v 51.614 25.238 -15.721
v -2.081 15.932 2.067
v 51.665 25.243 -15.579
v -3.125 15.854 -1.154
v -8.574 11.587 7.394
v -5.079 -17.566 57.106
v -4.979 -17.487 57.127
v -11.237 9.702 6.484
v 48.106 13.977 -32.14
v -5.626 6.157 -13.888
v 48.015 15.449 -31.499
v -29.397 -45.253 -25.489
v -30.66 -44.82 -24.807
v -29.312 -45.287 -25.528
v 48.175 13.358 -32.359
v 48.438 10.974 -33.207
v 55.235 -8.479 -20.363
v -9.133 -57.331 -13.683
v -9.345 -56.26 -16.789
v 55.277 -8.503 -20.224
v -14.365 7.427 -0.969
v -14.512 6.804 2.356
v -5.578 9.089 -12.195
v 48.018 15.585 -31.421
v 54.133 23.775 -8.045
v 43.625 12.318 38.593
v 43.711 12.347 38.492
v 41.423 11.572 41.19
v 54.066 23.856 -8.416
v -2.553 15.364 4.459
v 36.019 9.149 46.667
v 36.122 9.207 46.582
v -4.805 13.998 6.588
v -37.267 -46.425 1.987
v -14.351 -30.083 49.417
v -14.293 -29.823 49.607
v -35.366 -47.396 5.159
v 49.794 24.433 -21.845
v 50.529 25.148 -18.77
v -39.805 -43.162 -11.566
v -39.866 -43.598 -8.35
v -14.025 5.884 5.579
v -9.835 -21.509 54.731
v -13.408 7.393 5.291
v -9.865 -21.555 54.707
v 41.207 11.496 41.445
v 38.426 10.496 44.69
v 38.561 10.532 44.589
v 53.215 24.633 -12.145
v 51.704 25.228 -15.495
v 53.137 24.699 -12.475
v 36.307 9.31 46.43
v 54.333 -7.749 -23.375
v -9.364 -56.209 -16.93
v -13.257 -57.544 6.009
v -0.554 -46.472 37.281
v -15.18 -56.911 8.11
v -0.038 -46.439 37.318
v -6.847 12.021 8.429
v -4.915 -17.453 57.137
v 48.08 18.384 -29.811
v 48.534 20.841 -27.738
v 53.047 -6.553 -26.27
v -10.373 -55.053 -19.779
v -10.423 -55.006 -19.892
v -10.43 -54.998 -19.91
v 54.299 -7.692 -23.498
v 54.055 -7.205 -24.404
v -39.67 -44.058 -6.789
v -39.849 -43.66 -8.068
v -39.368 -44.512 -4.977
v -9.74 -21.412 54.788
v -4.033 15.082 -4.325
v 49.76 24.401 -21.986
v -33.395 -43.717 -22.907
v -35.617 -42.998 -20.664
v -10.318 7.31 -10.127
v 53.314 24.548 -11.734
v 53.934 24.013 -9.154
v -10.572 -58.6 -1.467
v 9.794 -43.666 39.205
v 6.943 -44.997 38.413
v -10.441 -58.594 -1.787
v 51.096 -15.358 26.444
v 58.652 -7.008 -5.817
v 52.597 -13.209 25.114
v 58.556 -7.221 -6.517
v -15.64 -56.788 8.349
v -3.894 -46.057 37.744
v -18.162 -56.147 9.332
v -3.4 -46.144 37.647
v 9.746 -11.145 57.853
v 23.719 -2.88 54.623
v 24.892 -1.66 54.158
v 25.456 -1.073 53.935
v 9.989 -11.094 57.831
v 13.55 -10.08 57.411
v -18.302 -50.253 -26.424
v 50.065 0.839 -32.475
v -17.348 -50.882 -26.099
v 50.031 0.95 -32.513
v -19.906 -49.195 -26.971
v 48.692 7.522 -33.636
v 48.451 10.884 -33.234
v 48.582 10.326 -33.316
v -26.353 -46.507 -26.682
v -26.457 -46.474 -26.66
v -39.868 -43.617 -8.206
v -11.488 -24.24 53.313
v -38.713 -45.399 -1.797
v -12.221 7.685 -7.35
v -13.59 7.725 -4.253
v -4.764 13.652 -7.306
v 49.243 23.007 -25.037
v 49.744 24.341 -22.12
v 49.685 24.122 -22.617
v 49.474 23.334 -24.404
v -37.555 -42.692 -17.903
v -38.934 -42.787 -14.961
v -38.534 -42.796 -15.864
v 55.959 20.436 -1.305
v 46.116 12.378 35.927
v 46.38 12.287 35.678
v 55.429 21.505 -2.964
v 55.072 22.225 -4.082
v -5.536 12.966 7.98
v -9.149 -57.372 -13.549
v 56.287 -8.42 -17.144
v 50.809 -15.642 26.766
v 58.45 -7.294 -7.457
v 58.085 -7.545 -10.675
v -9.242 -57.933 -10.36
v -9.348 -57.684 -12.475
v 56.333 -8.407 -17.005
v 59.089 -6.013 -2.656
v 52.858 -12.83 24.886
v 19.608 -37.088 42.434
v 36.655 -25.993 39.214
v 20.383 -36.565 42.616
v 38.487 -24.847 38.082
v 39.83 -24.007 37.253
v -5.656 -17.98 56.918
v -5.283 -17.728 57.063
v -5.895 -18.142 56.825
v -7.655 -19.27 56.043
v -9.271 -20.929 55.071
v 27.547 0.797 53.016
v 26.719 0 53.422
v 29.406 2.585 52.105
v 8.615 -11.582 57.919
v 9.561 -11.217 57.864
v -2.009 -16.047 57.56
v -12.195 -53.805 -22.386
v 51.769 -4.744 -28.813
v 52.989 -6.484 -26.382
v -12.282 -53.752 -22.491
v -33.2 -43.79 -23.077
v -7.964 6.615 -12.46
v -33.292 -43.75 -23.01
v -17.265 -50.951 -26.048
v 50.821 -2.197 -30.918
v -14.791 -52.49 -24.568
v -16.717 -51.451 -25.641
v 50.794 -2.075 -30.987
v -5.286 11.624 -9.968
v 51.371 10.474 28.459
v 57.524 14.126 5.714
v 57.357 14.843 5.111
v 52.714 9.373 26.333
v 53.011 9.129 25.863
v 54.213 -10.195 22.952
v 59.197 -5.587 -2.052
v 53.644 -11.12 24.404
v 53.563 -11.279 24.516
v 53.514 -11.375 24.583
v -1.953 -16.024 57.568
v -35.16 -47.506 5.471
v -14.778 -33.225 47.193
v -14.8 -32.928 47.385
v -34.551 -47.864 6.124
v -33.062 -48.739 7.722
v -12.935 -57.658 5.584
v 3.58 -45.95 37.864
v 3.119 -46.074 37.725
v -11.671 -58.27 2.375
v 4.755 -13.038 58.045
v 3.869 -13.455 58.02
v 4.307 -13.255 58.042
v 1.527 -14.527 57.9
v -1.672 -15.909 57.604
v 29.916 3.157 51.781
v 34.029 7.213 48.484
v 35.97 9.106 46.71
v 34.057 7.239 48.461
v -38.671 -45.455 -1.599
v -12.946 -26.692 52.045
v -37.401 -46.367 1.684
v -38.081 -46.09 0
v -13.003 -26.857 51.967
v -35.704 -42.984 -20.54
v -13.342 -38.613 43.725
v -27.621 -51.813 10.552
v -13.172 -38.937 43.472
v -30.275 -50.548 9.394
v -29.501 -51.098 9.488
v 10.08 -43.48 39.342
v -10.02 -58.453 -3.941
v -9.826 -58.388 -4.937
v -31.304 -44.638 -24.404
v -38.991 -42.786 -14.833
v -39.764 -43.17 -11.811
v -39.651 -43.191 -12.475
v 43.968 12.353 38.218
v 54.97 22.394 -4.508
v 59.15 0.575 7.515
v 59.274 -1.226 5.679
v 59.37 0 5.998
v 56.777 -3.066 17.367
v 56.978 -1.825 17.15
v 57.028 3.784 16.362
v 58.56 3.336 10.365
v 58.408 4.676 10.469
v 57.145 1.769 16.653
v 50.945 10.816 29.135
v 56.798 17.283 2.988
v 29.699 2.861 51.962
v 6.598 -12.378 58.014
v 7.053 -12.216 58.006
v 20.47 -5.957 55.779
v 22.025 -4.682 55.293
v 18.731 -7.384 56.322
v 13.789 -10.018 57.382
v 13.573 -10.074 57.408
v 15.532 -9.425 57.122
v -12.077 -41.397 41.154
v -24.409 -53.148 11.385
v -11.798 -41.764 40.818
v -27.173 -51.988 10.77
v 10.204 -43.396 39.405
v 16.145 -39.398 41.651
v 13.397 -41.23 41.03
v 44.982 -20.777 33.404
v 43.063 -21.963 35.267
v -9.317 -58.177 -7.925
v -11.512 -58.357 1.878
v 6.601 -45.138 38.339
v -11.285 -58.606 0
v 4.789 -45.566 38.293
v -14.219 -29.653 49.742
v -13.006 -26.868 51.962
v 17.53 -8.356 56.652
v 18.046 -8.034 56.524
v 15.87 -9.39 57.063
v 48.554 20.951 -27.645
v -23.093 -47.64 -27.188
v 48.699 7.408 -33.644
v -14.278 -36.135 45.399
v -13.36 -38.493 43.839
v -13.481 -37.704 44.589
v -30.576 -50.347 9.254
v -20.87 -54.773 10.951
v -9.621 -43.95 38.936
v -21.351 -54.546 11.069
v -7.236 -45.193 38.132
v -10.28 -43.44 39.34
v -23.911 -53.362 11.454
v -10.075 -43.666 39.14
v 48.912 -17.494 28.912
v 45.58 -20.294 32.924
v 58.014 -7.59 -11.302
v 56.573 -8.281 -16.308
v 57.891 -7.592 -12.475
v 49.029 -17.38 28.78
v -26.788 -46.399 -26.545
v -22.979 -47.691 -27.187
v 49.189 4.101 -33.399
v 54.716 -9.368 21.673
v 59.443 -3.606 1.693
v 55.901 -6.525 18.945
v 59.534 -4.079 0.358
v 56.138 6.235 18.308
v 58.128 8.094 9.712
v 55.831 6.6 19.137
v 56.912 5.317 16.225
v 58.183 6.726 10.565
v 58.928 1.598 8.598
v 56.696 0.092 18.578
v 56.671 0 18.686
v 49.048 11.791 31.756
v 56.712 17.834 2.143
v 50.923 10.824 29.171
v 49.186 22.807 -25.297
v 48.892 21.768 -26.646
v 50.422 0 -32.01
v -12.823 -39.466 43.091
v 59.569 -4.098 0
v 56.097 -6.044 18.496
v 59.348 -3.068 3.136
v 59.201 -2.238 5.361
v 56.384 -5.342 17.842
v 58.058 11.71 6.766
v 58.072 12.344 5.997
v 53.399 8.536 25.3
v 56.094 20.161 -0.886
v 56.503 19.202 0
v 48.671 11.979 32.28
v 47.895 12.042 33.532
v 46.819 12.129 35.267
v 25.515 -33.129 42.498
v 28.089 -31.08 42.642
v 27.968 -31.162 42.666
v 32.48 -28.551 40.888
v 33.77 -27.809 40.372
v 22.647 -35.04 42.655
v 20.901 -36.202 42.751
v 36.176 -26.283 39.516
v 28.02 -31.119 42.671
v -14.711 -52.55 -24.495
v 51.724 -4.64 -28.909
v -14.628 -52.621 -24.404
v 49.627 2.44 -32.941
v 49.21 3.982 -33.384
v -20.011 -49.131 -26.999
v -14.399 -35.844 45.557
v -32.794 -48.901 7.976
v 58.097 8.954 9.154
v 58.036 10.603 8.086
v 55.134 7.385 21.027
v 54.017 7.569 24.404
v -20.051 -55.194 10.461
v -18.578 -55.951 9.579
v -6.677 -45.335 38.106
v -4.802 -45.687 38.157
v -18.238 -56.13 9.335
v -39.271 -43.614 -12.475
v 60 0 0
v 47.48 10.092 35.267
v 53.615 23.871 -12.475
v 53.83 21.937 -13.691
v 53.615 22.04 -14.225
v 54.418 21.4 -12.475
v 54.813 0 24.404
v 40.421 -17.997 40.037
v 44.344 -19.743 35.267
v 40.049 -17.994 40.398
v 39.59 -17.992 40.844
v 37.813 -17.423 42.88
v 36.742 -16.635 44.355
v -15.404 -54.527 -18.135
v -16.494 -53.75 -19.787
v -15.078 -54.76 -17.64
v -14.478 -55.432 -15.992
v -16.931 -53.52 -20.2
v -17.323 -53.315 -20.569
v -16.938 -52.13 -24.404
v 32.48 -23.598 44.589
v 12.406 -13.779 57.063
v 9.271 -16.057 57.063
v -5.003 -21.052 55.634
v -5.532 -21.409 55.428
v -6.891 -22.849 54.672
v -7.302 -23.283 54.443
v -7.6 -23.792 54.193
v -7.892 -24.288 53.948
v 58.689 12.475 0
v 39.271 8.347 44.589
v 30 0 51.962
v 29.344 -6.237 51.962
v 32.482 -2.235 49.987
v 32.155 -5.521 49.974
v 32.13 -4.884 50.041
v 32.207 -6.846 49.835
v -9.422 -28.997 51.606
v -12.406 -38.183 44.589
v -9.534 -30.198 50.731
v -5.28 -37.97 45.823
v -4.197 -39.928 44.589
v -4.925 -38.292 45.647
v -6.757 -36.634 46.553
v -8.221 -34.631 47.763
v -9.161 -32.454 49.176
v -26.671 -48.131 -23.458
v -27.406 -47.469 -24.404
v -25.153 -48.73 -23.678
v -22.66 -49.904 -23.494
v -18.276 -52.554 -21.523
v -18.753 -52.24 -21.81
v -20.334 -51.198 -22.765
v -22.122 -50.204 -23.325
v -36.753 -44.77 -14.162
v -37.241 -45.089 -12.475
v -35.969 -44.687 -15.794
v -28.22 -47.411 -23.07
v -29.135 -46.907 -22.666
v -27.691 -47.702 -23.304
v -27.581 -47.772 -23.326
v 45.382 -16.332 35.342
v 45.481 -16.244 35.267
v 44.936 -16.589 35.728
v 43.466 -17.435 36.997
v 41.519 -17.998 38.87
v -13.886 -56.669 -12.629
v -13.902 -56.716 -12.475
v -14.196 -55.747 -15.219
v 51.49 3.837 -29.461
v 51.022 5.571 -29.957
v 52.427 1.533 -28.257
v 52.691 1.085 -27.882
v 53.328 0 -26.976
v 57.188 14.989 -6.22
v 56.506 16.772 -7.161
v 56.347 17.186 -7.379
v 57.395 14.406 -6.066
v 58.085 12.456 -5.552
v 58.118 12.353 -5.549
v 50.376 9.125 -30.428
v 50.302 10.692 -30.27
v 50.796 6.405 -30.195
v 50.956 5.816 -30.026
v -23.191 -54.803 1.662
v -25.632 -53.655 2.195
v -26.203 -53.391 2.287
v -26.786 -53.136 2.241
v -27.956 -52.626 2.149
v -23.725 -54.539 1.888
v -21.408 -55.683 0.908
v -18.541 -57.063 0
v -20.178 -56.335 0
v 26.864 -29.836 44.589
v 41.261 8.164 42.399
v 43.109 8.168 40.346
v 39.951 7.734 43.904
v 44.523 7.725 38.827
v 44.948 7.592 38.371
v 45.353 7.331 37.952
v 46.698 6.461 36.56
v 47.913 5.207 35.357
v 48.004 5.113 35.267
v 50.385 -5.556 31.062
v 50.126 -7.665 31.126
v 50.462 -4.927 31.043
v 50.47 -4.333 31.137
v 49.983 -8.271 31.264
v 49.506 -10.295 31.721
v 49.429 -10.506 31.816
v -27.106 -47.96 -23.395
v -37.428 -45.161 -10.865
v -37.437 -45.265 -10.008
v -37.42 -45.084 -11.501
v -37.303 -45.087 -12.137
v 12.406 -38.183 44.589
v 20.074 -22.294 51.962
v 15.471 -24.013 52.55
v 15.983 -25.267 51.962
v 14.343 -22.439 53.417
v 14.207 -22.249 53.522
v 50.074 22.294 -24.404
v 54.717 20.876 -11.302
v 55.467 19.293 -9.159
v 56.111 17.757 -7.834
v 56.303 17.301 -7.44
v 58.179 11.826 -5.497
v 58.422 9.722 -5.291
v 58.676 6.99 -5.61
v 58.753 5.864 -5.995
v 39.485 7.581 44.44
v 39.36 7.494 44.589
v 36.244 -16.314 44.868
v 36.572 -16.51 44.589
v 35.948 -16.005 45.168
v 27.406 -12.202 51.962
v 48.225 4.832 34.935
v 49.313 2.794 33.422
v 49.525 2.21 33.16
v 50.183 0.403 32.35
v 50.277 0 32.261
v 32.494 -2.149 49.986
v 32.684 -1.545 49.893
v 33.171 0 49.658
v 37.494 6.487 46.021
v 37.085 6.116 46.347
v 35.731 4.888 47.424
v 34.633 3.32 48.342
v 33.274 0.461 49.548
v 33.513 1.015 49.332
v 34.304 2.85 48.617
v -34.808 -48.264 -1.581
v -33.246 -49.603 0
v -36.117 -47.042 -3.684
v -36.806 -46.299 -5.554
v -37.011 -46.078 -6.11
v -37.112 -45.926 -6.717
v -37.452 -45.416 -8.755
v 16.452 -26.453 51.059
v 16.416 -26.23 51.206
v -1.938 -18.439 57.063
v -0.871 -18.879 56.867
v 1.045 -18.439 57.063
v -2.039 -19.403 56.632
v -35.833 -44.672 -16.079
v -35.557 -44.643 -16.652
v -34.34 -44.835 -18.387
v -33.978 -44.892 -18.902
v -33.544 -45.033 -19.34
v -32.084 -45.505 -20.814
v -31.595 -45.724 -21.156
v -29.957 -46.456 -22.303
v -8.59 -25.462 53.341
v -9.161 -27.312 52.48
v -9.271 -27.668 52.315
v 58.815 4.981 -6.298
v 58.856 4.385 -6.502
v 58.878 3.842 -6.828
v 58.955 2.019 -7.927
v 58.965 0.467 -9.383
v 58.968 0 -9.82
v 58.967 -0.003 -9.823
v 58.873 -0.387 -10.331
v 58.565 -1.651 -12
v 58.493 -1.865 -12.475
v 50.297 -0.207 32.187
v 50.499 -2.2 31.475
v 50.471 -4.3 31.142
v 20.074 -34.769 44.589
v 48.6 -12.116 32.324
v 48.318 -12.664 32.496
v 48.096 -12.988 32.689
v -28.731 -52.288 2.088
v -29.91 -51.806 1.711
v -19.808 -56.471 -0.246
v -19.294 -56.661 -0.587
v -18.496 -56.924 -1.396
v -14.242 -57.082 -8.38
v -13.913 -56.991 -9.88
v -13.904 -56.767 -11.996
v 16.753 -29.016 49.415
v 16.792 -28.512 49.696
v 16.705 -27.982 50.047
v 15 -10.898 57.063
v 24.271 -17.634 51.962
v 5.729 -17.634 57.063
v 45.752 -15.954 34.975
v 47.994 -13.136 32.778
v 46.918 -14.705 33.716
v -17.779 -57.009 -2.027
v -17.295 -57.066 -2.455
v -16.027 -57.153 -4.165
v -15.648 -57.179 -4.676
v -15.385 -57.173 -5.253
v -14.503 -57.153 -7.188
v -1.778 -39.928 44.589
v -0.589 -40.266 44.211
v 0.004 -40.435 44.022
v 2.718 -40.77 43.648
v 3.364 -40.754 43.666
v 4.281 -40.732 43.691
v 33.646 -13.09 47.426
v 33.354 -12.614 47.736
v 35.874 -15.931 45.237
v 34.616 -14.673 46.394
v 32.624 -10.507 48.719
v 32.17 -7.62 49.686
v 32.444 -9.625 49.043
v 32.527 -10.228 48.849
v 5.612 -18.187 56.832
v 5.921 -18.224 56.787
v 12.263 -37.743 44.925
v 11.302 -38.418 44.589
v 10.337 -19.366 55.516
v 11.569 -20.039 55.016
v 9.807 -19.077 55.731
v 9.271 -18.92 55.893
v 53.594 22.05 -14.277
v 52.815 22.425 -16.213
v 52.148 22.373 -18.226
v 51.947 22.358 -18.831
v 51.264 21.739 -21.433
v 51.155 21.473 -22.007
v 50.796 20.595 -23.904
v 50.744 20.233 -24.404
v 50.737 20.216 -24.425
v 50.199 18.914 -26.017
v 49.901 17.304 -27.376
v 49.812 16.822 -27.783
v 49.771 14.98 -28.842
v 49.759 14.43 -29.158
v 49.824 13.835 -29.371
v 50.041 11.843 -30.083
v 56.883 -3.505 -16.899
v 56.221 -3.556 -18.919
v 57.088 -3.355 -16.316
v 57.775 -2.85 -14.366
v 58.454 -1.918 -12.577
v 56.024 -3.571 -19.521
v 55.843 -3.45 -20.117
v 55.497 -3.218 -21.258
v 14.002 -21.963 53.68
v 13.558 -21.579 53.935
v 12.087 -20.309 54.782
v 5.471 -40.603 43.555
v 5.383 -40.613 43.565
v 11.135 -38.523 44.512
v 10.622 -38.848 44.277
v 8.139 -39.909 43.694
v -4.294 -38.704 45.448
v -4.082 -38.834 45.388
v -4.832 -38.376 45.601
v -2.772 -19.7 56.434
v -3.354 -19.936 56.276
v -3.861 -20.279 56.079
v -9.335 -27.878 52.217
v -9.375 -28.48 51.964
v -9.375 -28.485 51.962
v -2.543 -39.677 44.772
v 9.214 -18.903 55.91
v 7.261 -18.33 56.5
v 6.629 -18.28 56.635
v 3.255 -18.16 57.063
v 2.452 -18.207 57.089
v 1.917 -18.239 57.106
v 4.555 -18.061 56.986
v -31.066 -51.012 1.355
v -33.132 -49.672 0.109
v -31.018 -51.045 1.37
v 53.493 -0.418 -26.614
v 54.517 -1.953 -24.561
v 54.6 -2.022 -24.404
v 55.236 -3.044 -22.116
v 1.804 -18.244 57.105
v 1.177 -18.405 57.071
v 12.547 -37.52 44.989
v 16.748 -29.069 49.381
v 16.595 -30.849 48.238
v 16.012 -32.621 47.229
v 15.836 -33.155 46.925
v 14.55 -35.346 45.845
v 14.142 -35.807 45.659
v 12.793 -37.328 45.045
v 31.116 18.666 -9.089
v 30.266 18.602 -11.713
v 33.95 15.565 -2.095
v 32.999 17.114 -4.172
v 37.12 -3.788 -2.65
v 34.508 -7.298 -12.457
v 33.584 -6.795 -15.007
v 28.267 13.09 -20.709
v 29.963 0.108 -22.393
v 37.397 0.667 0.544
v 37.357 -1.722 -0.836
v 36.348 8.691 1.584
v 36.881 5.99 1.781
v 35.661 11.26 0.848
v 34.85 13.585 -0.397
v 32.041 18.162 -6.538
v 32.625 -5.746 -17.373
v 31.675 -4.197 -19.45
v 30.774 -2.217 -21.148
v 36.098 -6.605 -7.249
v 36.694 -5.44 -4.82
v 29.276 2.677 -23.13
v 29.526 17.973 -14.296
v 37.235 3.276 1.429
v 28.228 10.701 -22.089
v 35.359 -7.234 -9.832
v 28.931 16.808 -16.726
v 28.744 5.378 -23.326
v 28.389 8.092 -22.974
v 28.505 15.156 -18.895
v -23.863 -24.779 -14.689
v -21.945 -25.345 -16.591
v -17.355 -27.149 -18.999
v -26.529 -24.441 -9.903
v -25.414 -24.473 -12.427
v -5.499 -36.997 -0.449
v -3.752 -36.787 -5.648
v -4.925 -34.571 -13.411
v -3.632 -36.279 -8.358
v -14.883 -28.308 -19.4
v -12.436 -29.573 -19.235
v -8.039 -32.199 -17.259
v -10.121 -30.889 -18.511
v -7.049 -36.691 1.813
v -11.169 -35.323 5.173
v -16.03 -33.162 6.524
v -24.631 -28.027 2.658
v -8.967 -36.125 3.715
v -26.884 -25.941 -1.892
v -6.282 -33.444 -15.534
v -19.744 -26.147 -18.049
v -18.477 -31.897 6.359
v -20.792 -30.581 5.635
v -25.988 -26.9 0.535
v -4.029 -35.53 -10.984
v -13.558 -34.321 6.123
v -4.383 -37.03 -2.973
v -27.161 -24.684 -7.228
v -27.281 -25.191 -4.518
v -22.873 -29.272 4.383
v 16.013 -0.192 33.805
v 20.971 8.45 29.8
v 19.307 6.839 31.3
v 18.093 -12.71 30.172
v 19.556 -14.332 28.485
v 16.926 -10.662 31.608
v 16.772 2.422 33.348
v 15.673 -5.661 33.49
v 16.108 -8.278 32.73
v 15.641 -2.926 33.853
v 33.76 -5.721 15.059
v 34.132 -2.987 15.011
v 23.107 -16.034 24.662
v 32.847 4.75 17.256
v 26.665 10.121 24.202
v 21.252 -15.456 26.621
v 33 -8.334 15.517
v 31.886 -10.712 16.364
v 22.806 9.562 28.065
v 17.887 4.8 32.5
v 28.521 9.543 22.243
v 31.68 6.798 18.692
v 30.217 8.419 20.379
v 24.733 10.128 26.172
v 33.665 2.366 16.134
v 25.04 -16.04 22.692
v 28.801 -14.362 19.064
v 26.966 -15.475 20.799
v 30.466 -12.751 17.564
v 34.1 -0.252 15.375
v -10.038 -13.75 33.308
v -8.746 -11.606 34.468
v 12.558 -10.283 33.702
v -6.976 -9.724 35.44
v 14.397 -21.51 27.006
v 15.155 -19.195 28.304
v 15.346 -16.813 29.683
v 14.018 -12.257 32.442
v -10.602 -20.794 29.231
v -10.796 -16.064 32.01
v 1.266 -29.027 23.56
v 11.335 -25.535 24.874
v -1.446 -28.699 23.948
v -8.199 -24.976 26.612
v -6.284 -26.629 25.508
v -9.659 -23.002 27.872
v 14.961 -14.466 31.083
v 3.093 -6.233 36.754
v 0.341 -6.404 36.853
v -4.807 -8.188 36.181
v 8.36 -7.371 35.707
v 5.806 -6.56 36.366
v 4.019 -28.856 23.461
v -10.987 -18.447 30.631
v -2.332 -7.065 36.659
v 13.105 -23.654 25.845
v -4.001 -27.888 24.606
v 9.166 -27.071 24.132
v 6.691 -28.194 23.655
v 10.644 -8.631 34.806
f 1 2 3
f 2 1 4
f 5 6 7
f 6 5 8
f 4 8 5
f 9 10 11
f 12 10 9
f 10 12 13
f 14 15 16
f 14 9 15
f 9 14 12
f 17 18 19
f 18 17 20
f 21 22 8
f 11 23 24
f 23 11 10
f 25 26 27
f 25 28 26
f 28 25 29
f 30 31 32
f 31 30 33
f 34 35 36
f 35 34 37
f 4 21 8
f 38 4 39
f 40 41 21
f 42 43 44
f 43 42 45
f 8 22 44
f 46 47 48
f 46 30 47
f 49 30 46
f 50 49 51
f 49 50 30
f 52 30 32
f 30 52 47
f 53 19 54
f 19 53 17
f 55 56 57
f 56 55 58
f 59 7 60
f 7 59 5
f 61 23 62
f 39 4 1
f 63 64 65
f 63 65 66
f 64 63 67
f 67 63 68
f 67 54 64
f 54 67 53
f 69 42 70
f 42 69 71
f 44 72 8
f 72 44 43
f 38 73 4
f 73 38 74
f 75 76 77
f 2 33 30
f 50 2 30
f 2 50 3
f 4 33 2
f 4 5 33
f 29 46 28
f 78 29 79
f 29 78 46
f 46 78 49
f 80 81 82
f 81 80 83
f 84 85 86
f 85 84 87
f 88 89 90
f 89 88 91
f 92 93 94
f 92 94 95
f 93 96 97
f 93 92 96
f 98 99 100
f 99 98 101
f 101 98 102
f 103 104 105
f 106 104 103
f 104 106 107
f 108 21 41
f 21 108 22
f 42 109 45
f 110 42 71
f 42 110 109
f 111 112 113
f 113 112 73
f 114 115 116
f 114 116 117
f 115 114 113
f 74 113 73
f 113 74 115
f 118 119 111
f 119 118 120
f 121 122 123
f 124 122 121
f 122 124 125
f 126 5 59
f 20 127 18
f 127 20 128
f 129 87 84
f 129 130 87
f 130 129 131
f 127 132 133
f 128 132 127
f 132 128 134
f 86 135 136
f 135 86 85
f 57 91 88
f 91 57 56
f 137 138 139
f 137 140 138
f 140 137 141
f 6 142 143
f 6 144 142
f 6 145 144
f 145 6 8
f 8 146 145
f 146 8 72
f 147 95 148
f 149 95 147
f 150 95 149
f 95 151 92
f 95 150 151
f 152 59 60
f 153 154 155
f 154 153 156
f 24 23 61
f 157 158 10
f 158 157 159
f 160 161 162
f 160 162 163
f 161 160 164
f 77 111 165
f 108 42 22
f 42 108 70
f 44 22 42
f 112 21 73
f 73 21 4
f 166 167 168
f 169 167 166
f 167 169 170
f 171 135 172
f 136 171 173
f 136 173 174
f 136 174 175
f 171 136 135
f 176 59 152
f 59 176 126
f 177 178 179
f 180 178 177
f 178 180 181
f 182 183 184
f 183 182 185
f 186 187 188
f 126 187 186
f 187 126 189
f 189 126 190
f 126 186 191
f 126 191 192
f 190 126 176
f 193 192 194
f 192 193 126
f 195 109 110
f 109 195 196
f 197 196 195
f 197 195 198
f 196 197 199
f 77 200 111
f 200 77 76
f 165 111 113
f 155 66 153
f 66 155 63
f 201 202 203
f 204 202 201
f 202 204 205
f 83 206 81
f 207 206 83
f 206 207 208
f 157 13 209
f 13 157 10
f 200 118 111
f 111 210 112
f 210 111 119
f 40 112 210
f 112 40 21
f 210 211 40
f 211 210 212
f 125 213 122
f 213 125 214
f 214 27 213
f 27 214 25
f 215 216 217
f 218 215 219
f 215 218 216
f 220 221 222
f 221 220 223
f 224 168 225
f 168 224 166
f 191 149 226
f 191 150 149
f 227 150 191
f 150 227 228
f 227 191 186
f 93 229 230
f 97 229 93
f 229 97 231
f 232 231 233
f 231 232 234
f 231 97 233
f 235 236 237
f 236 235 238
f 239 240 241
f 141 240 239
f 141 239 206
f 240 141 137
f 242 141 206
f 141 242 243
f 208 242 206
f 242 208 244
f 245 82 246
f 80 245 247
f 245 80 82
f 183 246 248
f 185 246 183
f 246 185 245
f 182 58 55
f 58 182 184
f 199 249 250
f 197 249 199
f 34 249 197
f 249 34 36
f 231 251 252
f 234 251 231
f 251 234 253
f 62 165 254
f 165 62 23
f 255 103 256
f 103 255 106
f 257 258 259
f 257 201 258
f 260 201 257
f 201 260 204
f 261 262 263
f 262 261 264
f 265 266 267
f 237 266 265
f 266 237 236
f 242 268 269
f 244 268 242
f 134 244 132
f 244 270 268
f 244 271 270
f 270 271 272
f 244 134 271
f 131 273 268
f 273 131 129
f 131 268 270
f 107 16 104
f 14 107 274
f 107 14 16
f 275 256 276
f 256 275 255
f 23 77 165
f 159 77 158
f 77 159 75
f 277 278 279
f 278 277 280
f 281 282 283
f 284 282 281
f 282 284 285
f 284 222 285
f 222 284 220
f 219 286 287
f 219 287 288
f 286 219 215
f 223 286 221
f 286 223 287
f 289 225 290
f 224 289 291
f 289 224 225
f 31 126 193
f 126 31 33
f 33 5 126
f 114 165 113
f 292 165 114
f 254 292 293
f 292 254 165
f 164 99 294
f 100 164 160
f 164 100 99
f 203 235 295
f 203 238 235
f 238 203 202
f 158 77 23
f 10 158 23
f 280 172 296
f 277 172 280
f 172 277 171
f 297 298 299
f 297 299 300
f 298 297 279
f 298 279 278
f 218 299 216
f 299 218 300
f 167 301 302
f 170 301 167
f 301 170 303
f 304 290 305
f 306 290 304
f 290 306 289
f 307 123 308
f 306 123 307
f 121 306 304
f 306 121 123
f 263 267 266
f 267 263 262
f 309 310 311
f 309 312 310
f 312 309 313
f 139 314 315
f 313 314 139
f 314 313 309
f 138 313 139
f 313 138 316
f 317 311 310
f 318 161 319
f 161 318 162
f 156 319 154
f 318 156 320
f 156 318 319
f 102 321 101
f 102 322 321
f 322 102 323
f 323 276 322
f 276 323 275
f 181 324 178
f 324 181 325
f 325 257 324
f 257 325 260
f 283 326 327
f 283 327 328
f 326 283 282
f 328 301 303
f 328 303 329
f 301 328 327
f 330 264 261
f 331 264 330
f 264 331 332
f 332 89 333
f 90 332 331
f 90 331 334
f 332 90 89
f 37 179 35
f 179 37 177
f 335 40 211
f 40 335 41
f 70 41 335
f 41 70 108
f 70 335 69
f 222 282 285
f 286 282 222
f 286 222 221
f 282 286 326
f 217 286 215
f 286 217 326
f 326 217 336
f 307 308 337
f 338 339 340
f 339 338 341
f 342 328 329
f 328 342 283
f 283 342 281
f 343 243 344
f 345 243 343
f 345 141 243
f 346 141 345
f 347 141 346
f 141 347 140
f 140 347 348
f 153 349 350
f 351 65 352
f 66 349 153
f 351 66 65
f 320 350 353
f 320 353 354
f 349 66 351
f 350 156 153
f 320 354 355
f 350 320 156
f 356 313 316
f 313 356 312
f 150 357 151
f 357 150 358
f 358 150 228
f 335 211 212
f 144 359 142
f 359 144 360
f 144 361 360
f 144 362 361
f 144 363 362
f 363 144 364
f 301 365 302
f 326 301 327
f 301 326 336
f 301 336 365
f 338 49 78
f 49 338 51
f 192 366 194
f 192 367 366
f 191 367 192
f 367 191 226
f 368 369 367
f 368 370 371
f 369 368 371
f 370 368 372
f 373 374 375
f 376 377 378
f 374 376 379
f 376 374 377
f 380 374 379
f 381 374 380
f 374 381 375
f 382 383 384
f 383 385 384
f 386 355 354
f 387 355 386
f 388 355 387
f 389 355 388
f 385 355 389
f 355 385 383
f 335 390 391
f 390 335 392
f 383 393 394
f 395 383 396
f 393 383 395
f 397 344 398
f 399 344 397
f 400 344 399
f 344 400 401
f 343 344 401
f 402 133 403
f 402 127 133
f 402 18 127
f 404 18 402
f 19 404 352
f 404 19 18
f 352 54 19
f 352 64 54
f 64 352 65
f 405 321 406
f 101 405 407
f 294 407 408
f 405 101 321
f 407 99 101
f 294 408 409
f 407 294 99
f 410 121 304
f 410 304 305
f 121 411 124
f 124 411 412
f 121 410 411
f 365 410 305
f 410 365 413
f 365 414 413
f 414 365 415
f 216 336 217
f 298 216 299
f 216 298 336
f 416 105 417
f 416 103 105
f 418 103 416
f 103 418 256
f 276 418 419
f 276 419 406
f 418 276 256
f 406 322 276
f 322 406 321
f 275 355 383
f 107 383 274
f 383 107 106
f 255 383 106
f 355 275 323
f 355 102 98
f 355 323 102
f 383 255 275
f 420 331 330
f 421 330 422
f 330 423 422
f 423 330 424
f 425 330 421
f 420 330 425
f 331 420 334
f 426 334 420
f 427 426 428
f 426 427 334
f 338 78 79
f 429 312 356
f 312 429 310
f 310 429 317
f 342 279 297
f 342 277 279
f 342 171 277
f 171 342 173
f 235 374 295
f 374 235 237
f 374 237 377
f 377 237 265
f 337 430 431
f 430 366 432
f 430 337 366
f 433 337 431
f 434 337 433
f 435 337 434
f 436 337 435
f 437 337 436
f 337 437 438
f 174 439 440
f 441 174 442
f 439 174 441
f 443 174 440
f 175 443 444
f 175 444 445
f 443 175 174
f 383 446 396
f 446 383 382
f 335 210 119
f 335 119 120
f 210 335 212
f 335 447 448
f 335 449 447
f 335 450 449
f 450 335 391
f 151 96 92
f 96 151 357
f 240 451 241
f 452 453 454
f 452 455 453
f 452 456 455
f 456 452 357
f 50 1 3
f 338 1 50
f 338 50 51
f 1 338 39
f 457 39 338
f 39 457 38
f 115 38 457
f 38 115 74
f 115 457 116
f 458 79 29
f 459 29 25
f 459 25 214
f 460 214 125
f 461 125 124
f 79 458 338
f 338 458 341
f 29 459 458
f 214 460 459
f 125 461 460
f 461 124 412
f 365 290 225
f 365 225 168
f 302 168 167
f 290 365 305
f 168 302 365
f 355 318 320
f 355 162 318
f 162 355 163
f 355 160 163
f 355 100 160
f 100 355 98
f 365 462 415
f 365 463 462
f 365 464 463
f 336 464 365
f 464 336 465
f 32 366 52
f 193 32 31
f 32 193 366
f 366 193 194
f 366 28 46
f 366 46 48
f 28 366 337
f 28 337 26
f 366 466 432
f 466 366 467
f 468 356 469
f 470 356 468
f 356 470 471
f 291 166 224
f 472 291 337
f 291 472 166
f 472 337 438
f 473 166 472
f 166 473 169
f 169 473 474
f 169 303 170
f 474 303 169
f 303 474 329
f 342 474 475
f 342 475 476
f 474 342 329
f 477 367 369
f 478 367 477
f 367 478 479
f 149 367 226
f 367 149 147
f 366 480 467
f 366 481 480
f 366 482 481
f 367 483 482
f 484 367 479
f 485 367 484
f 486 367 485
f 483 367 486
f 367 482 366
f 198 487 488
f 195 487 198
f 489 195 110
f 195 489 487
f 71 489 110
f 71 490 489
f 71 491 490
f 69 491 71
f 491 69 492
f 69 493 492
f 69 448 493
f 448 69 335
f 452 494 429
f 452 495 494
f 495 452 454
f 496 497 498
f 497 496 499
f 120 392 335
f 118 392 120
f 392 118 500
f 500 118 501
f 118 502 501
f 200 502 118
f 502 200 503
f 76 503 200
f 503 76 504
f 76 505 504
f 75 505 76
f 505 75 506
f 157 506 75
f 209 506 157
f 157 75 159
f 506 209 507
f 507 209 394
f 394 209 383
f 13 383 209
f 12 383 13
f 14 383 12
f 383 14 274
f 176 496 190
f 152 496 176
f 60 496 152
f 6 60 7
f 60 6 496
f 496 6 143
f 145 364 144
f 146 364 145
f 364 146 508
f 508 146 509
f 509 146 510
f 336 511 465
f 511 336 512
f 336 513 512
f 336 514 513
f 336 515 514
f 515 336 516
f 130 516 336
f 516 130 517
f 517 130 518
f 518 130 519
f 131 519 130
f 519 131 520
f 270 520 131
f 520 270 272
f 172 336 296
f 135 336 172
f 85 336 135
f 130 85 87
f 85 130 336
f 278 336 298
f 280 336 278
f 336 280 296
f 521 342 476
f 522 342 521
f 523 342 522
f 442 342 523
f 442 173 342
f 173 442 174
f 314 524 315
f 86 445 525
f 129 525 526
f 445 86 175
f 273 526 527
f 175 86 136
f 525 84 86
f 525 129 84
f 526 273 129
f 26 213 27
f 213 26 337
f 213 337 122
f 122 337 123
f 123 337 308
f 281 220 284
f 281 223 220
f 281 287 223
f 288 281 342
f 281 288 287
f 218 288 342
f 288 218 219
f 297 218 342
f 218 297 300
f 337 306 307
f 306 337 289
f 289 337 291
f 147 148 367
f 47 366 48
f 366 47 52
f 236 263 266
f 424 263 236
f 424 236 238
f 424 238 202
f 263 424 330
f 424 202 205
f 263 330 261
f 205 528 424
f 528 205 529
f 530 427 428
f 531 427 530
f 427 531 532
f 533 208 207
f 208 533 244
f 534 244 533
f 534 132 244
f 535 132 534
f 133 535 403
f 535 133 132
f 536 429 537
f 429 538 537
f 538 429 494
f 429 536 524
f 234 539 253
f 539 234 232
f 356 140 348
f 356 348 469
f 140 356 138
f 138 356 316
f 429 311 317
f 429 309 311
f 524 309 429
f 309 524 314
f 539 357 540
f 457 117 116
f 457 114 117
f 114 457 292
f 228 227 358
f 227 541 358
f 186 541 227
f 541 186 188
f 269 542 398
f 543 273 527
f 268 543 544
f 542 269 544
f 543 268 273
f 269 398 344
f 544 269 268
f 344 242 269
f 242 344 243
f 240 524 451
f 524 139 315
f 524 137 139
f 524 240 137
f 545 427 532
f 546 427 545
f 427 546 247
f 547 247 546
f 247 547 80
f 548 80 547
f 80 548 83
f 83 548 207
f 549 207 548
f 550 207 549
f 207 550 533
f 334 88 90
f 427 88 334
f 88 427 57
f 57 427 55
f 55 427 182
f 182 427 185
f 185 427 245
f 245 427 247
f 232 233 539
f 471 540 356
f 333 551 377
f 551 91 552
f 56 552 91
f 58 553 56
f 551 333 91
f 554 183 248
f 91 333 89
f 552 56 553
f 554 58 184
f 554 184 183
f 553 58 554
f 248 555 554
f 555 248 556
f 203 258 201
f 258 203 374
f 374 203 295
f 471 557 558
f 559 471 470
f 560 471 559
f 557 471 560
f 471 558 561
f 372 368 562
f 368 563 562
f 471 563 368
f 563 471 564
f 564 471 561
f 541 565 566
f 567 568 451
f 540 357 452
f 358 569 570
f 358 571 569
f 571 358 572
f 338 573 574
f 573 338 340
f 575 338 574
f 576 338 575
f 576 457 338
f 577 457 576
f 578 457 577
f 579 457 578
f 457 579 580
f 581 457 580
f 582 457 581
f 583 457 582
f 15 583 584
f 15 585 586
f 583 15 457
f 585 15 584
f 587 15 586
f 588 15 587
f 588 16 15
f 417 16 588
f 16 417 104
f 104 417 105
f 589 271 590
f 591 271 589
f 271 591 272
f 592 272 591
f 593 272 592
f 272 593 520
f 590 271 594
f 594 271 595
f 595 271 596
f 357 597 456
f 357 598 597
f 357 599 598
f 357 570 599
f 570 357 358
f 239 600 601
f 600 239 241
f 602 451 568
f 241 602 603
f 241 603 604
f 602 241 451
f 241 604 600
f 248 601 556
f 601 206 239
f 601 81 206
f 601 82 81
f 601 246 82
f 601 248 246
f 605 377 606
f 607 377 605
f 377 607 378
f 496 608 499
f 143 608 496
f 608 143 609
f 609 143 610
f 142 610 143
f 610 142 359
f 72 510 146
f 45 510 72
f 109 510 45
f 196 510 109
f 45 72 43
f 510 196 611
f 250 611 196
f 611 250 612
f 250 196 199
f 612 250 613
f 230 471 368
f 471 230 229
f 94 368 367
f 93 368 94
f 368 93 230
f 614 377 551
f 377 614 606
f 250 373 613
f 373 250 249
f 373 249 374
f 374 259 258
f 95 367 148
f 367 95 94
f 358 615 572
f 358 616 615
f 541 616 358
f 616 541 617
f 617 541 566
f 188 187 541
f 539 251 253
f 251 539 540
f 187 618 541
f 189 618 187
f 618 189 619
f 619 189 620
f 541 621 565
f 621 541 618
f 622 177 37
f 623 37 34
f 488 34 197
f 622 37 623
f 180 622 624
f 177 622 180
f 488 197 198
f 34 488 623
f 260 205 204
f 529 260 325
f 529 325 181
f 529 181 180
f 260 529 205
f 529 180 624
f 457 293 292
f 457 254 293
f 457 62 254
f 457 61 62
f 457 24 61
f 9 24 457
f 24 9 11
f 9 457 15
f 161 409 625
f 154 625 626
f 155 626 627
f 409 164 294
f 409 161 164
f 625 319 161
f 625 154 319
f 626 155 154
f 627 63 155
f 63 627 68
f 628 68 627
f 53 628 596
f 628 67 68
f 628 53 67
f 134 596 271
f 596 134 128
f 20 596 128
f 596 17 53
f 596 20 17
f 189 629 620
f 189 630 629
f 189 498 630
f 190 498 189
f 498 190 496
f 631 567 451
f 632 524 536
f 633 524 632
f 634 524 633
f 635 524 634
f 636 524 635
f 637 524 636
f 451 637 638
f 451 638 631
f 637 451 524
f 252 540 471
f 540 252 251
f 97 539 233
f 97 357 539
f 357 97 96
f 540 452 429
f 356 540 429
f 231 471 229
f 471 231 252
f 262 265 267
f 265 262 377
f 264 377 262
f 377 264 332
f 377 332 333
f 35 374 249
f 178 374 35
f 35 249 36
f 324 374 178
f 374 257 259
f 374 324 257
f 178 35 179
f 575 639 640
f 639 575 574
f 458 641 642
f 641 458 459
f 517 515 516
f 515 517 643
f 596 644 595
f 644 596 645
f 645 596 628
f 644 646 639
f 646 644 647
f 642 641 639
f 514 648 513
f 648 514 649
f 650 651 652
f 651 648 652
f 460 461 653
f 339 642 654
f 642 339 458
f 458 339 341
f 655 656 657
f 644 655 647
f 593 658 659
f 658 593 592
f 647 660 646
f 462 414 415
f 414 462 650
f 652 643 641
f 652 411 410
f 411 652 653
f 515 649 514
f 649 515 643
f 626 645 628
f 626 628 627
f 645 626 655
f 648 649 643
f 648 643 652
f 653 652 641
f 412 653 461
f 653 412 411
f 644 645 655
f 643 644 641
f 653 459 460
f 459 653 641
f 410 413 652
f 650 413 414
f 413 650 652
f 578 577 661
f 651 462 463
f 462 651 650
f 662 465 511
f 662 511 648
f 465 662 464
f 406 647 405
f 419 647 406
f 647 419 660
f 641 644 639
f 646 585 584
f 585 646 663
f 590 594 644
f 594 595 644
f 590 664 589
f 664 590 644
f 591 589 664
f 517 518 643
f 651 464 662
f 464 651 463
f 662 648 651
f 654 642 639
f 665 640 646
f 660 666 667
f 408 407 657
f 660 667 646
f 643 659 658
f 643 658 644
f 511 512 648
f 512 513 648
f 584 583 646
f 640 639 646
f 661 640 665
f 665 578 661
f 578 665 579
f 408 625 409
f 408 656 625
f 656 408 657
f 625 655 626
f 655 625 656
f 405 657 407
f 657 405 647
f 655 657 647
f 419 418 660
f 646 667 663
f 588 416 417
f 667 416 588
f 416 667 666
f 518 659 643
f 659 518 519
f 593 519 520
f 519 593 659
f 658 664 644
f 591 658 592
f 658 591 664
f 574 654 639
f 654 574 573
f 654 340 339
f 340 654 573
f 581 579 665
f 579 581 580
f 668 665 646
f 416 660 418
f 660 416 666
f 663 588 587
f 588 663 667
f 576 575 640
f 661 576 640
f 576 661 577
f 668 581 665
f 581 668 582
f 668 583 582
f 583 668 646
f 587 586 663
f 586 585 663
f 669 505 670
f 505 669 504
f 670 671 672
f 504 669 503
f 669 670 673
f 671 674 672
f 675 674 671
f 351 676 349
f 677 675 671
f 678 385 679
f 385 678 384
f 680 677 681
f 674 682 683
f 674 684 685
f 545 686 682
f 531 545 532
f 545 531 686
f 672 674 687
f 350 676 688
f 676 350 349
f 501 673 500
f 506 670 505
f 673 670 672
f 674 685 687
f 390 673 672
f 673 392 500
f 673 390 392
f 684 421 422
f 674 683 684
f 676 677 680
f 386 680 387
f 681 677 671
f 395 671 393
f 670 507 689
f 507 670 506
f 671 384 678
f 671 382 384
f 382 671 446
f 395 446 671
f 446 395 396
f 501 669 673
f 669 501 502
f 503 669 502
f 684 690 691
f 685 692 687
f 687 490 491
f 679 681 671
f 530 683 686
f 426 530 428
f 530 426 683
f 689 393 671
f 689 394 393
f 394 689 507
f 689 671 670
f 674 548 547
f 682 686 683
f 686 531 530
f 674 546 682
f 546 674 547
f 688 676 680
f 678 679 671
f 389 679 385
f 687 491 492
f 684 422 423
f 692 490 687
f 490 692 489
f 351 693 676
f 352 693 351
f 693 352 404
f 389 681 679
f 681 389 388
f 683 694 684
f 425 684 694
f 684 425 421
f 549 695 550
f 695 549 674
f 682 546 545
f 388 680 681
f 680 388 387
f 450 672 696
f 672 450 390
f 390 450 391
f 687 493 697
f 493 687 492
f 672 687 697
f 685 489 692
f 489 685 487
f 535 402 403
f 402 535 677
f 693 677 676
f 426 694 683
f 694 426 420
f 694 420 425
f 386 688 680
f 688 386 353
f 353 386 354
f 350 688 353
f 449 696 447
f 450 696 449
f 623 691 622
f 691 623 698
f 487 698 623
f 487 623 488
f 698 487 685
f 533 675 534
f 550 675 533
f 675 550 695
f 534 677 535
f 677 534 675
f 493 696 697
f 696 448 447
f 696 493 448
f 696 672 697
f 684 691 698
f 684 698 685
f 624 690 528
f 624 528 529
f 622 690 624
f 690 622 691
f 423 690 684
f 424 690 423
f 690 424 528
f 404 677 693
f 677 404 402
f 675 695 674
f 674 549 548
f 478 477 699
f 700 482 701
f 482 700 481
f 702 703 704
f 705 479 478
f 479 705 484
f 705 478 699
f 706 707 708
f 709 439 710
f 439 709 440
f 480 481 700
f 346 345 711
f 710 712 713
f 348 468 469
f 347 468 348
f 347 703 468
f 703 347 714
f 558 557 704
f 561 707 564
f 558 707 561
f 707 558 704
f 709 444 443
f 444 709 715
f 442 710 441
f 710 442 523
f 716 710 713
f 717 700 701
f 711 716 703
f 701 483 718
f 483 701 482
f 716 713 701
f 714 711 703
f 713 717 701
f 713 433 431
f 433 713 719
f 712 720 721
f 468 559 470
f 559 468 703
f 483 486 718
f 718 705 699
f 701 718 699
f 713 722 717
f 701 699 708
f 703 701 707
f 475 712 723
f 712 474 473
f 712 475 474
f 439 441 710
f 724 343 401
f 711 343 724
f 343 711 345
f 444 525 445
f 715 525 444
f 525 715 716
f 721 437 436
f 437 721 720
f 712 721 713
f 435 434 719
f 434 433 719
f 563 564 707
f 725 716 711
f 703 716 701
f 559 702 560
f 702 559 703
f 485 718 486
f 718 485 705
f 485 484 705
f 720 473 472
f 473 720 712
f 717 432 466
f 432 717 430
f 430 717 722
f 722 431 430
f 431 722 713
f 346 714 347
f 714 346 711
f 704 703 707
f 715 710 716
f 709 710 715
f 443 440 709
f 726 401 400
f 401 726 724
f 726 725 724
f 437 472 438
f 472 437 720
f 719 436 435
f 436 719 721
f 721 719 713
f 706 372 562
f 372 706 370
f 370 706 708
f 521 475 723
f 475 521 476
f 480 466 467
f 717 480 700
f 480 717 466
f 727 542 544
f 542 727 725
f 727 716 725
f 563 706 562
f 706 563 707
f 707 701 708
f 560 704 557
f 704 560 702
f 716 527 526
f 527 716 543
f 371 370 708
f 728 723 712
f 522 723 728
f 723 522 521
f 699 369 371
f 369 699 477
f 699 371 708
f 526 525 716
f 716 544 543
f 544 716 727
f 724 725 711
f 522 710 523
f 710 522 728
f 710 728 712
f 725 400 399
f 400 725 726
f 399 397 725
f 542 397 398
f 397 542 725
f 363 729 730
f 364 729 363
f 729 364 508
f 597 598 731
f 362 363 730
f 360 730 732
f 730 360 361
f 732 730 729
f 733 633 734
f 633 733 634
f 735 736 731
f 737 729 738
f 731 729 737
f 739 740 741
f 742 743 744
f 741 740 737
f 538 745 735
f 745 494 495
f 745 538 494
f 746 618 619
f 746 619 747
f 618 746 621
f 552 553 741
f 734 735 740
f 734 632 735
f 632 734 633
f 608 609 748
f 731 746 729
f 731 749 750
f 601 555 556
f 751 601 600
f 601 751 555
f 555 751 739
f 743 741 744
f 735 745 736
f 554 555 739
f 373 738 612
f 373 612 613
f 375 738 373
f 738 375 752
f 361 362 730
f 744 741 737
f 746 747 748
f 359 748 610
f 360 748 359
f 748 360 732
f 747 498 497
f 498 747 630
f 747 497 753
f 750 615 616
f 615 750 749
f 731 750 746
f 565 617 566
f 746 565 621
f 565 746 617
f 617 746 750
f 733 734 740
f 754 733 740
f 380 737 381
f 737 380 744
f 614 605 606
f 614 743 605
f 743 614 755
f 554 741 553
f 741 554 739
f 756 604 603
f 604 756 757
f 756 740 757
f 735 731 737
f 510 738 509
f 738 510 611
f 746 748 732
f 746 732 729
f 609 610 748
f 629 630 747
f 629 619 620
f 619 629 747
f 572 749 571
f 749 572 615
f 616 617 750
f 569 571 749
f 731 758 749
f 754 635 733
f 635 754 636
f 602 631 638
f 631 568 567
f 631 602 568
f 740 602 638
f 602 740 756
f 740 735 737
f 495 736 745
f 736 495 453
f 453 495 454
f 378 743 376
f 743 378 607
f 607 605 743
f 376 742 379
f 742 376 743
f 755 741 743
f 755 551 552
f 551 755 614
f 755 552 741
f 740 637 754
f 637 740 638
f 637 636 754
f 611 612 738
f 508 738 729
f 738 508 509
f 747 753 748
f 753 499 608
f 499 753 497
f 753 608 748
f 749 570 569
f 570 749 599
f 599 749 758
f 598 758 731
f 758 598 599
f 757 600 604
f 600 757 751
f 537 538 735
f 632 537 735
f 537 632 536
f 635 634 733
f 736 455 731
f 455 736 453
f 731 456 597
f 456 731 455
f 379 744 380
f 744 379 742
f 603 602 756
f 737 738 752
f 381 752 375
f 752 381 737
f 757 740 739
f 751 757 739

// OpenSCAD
difference() {
	intersection() {
		hull() {
			rotate(a = -150.2044300830, v = [0.3560759648, 0.3465924684, -0.0000000000]) {
				rotate(a = -90.0000000000, v = [0.9914448614, -0.1305261922, 0.0000000000]) {
					cylinder(h = 60, r = 16.2000000000);
				}
			}
			rotate(a = -150.2044300830, v = [0.3560759648, 0.3465924684, -0.0000000000]) {
				rotate(a = -90.0000000000, v = [-0.3826834324, 0.9238795325, 0.0000000000]) {
					cylinder(h = 60, r = 16.2000000000);
				}
			}
			rotate(a = -150.2044300830, v = [0.3560759648, 0.3465924684, -0.0000000000]) {
				rotate(a = -151.9205722594, v = [0.4117825928, -0.2280109476, 0.0000000000]) {
					cylinder(h = 60, r = 16.2000000000);
				}
			}
			rotate(a = -150.2044300830, v = [0.3560759648, 0.3465924684, -0.0000000000]) {
				rotate(a = -161.5616070448, v = [-0.2692672153, 0.1659253944, 0.0000000000]) {
					cylinder(h = 60, r = 16.2000000000);
				}
			}
		}
		sphere(r = 60);
	}
	union() {
		rotate(a = -150.2044300830, v = [0.3560759648, 0.3465924684, -0.0000000000]) {
			rotate(a = -90.0000000000, v = [0.9914448614, -0.1305261922, 0.0000000000]) {
				translate(v = [0, 0, 35]) {
					cylinder(h = 100, r = 13.2000000000);
				}
			}
		}
		rotate(a = -150.2044300830, v = [0.3560759648, 0.3465924684, -0.0000000000]) {
			rotate(a = -90.0000000000, v = [-0.3826834324, 0.9238795325, 0.0000000000]) {
				translate(v = [0, 0, 35]) {
					cylinder(h = 100, r = 13.2000000000);
				}
			}
		}
		rotate(a = -150.2044300830, v = [0.3560759648, 0.3465924684, -0.0000000000]) {
			rotate(a = -151.9205722594, v = [0.4117825928, -0.2280109476, 0.0000000000]) {
				translate(v = [0, 0, 35]) {
					cylinder(h = 100, r = 13.2000000000);
				}
			}
		}
		rotate(a = -150.2044300830, v = [0.3560759648, 0.3465924684, -0.0000000000]) {
			rotate(a = -161.5616070448, v = [-0.2692672153, 0.1659253944, 0.0000000000]) {
				translate(v = [0, 0, 35]) {
					cylinder(h = 100, r = 13.2000000000);
				}
			}
		}
	}
}
